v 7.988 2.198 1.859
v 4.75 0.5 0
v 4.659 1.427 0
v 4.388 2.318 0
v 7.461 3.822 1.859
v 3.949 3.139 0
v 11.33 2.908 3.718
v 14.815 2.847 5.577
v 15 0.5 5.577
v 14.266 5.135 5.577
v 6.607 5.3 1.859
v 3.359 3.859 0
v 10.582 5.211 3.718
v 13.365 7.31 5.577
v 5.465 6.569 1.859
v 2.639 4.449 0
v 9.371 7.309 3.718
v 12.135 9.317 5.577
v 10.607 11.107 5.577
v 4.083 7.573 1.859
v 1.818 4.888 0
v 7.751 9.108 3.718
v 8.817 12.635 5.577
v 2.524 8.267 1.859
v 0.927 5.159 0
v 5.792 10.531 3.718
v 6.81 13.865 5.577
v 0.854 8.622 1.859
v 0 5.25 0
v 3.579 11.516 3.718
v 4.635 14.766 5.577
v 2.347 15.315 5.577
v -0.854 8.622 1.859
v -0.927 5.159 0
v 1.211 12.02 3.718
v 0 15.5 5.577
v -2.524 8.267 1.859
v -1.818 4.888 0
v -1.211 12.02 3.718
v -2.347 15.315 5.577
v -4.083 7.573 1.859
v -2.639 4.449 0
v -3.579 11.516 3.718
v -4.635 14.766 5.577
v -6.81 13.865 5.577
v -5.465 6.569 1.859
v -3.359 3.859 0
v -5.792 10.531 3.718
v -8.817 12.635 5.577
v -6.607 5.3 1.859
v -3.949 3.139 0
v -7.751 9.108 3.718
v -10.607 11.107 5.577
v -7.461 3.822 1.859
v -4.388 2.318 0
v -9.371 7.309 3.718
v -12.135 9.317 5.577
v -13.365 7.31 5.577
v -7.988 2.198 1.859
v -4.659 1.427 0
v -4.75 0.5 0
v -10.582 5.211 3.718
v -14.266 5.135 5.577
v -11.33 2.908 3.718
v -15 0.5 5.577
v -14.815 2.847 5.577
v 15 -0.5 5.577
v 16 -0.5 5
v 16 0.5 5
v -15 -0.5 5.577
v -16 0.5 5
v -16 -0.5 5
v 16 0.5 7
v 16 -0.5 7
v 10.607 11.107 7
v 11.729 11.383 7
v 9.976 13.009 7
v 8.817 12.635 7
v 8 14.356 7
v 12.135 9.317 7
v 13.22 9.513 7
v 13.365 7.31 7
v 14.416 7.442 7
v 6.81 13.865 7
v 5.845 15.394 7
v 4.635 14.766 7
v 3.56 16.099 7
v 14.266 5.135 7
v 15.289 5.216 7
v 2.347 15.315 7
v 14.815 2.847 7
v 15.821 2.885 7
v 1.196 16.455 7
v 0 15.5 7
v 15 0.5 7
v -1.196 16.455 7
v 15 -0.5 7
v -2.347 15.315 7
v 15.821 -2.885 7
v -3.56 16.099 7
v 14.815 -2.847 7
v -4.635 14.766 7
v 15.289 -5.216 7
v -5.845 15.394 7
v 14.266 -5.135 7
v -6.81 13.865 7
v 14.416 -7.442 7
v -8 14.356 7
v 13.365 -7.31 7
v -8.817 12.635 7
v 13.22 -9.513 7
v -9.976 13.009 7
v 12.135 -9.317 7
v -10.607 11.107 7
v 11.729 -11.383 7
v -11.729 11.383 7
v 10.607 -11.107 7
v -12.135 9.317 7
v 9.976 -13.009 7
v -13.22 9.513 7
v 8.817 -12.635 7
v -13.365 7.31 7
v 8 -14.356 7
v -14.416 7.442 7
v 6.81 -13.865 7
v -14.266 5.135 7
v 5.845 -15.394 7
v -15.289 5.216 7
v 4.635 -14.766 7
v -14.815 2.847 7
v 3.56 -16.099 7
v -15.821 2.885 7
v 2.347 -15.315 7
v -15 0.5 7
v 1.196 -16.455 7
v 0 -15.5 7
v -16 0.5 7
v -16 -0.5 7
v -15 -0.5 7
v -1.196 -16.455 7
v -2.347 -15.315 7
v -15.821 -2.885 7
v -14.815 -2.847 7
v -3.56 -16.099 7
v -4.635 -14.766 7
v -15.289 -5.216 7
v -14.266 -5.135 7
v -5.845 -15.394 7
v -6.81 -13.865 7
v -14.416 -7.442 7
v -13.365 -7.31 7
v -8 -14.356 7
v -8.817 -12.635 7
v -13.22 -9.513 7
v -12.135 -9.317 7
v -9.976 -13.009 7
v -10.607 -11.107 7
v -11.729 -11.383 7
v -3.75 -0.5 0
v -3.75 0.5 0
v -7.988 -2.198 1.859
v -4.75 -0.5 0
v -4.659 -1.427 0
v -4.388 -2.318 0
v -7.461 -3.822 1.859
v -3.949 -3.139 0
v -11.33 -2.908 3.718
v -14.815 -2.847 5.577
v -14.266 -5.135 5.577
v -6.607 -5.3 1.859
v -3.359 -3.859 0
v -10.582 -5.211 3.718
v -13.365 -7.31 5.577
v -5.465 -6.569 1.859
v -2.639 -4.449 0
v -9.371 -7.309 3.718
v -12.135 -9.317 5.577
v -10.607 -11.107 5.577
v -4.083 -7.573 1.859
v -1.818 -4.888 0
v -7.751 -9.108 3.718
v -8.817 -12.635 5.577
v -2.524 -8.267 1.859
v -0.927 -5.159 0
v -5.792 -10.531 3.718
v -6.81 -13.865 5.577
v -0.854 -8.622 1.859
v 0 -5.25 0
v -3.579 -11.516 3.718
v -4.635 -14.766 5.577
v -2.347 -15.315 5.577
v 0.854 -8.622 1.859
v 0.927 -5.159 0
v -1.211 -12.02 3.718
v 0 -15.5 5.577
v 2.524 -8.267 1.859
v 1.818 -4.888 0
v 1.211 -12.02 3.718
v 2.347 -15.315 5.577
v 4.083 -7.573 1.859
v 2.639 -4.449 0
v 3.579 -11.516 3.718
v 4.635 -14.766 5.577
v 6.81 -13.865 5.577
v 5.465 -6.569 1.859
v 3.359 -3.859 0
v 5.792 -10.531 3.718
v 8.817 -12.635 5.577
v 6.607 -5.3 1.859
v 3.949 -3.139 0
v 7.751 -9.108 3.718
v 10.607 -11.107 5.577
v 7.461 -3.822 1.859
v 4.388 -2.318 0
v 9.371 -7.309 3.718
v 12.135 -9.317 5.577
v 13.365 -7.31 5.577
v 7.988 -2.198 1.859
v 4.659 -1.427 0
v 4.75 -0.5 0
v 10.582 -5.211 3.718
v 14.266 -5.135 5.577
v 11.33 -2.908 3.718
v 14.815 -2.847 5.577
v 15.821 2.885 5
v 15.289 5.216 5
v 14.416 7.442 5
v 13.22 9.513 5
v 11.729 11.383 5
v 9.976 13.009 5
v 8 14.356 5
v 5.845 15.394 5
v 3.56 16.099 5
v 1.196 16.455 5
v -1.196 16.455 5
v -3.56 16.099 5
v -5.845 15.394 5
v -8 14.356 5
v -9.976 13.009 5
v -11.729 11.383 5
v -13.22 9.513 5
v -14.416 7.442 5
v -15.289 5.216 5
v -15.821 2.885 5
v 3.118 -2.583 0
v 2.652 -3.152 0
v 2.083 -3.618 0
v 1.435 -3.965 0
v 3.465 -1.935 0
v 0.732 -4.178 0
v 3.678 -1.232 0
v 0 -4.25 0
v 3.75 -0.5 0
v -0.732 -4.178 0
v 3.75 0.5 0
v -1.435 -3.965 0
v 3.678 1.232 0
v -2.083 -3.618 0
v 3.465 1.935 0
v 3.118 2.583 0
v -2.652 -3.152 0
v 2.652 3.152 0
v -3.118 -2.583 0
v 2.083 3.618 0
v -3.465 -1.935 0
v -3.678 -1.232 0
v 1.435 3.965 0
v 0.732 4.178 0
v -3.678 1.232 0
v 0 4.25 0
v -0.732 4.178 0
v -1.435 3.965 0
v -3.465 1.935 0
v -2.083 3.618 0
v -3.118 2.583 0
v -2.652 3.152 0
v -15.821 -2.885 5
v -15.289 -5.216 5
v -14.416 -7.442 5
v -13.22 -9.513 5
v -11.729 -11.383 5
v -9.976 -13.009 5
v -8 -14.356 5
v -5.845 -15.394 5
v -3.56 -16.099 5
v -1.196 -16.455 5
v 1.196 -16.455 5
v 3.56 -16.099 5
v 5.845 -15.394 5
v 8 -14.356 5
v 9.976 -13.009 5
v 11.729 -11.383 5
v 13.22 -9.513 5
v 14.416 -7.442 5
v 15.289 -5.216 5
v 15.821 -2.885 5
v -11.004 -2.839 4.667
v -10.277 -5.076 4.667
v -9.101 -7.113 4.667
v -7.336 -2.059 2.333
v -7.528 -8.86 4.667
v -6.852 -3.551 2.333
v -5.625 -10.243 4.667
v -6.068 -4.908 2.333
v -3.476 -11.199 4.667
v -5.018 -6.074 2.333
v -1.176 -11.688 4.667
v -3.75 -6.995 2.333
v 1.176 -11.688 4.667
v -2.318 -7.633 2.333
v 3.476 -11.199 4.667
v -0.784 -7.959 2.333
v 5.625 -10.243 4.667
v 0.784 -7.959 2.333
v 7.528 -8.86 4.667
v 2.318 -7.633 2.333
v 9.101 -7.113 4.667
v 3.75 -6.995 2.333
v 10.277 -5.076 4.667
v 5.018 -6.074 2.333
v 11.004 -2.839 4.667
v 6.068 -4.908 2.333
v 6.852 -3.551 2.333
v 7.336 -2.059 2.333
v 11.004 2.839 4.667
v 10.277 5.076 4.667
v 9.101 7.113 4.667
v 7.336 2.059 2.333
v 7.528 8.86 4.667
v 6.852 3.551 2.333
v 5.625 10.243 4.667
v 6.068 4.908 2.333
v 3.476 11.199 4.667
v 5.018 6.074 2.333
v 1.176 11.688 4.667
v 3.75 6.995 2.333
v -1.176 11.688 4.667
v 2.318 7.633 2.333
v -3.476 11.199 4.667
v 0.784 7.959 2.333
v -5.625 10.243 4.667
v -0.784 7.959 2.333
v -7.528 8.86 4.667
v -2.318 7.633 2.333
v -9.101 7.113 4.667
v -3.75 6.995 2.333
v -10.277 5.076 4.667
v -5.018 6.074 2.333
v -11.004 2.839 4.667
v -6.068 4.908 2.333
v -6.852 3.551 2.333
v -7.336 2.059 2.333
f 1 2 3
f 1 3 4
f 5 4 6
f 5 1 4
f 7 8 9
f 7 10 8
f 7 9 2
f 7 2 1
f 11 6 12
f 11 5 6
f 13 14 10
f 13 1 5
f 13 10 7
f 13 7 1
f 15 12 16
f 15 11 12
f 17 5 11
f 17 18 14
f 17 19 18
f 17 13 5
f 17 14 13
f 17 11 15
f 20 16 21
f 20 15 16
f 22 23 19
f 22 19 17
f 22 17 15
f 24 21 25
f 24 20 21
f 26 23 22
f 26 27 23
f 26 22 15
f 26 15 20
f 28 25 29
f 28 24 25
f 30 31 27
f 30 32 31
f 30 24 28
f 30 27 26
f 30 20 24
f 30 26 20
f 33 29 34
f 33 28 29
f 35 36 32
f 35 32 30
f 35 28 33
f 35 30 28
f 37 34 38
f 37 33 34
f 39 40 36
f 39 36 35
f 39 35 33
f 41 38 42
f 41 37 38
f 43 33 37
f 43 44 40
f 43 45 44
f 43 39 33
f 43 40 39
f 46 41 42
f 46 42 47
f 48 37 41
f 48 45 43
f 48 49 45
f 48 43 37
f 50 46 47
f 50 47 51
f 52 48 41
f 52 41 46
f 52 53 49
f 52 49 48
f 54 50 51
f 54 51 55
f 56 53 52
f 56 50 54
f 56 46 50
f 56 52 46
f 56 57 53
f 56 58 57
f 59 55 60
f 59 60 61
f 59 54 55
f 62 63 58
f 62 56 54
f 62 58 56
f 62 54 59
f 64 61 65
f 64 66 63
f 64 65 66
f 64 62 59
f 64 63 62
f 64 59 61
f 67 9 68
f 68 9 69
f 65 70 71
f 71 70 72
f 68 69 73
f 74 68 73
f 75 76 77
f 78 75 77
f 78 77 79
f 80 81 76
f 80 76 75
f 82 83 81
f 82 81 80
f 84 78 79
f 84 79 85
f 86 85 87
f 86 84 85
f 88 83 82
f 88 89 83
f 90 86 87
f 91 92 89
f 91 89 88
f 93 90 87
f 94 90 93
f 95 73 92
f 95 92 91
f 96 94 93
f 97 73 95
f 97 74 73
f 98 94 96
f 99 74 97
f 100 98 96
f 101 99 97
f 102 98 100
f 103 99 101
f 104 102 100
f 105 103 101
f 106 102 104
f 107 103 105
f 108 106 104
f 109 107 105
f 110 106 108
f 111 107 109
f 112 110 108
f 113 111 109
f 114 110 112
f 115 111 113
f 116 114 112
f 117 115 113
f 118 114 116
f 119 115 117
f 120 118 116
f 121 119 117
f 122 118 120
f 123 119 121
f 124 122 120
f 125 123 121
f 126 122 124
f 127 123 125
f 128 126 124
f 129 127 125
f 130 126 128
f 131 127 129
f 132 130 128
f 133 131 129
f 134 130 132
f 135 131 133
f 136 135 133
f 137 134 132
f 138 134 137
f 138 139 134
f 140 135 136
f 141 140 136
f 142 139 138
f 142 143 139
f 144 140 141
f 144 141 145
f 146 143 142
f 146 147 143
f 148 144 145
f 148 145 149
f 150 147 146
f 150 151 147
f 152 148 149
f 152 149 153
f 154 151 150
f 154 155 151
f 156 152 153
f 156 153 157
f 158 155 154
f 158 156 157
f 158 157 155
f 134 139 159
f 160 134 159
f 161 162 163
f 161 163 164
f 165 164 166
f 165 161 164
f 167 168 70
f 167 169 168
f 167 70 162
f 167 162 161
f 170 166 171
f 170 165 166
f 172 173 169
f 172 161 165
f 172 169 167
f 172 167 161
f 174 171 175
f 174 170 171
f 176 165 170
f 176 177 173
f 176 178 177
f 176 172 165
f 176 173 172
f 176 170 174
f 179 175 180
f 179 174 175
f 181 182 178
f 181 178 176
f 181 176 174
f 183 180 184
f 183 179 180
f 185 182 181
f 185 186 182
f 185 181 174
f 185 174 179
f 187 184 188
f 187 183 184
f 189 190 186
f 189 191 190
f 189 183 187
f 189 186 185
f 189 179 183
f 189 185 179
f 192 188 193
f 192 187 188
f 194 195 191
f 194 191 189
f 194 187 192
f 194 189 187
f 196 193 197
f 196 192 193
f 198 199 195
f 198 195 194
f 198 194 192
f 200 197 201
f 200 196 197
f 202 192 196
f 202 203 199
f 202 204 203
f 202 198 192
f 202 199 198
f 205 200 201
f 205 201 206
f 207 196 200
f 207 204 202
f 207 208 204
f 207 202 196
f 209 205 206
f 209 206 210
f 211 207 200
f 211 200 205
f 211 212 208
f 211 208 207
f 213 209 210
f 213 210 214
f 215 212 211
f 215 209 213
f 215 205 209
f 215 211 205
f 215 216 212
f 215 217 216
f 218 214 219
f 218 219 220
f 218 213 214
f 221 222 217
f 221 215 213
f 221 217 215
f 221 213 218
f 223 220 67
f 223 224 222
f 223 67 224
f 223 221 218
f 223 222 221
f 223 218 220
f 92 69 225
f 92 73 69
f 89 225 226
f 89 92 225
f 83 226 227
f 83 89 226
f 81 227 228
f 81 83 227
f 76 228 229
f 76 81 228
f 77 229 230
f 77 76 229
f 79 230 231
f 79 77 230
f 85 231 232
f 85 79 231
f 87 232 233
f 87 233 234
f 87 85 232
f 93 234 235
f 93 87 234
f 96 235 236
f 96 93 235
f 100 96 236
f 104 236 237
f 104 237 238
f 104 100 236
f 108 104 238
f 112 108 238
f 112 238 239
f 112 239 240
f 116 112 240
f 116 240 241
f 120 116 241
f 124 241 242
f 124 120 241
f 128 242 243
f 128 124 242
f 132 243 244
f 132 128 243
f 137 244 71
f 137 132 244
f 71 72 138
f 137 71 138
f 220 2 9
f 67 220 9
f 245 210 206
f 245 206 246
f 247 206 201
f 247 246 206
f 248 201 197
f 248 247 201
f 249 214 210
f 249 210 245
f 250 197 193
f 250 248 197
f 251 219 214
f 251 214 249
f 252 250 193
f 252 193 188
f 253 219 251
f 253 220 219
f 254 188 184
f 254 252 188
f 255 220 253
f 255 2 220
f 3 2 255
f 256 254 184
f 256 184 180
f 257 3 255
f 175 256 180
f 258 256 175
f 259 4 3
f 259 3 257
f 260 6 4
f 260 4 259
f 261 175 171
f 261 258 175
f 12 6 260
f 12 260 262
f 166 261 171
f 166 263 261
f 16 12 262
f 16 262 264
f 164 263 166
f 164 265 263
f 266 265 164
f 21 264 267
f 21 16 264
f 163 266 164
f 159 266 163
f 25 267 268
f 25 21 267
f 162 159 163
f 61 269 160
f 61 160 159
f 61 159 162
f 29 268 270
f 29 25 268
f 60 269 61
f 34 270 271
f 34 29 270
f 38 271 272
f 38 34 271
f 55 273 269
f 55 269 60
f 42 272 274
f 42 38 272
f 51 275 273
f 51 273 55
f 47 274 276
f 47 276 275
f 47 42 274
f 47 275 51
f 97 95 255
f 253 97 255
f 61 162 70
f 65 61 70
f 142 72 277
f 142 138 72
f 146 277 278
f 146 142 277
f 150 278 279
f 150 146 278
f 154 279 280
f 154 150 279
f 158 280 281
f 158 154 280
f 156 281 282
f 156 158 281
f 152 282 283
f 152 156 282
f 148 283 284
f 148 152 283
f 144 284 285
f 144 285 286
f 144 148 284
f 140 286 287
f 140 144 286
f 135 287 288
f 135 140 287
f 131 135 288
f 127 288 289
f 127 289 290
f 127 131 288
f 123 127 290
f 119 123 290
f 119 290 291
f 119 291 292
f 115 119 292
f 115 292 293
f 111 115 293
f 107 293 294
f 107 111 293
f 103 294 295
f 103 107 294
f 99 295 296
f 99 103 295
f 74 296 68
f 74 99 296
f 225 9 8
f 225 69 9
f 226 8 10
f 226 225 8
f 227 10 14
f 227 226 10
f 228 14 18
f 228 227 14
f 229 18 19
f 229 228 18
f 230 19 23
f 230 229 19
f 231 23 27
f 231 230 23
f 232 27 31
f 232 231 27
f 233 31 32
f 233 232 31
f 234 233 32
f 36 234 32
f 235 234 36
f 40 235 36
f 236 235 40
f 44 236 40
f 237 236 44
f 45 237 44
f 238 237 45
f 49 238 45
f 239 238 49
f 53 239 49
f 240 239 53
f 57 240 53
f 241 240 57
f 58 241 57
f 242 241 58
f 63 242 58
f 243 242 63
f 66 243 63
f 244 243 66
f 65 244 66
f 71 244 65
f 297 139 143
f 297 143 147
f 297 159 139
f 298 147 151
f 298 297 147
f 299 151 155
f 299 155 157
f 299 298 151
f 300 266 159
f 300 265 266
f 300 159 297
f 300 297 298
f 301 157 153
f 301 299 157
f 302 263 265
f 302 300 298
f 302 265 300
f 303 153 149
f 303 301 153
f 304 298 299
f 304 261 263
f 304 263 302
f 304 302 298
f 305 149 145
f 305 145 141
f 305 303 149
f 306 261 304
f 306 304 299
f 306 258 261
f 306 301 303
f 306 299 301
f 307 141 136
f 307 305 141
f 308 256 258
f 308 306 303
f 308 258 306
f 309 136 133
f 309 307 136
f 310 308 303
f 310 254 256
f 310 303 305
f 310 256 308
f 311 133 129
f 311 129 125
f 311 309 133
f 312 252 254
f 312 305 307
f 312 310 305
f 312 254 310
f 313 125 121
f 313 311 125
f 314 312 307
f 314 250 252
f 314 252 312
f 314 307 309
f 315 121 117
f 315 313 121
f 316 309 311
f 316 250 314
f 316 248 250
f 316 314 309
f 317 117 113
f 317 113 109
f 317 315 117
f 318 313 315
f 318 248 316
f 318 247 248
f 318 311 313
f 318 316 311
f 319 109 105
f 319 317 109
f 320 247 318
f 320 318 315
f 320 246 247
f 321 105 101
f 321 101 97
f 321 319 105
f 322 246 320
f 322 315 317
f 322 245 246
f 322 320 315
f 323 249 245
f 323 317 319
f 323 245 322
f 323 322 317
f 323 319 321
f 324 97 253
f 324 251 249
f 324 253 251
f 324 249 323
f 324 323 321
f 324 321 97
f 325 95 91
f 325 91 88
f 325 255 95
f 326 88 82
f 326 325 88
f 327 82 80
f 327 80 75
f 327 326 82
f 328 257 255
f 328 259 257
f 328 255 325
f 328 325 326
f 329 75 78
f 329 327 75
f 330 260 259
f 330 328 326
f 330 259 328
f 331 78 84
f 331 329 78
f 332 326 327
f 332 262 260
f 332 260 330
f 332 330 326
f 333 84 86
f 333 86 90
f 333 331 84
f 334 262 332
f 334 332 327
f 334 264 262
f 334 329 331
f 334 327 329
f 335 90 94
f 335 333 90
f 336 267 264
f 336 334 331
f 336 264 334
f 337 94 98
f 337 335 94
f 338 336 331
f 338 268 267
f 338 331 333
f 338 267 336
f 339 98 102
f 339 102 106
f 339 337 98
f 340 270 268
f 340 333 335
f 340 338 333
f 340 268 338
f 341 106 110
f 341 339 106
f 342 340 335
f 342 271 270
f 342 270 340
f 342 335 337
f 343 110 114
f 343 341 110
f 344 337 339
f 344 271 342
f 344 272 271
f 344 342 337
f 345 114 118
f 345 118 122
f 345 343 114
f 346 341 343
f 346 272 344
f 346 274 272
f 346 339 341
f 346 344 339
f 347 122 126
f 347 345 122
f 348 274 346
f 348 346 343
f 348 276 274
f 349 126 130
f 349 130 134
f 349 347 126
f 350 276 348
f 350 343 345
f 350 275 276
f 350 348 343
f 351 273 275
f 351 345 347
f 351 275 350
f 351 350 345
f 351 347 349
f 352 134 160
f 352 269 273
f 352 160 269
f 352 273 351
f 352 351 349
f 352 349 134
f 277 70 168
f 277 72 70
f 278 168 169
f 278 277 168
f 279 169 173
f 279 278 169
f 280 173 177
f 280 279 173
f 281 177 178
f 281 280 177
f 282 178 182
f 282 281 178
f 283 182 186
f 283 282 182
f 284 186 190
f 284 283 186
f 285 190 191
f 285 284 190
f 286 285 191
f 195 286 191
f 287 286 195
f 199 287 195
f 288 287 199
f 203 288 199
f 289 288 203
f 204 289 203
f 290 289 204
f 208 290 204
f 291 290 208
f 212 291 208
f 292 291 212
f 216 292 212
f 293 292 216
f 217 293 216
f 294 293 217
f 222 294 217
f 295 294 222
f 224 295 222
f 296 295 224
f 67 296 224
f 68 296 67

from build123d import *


with BuildPart() as f2:
    # F2: sweep along a path in F0
    with BuildLine(Plane.XY) as f2_path:
        ThreePointArc((4.75, 0.5), (0, 5.25), (-4.75, 0.5))
        Line((-4.75, 0.5), (-4.75, -0.5))
        ThreePointArc((-4.75, -0.5), (0, -5.25), (4.75, -0.5))
        Line((4.75, -0.5), (4.75, 0.5))
    # F1 (on Front) → F2 (sweep)
    with BuildSketch(Plane.XZ):
        Polygon((3.75, 0), (4.75, 0), (15, 5.57735), (16, 5), (16, 7), (15, 7), align=None)
    sweep(path=f2_path.line)


solid = f2.part
